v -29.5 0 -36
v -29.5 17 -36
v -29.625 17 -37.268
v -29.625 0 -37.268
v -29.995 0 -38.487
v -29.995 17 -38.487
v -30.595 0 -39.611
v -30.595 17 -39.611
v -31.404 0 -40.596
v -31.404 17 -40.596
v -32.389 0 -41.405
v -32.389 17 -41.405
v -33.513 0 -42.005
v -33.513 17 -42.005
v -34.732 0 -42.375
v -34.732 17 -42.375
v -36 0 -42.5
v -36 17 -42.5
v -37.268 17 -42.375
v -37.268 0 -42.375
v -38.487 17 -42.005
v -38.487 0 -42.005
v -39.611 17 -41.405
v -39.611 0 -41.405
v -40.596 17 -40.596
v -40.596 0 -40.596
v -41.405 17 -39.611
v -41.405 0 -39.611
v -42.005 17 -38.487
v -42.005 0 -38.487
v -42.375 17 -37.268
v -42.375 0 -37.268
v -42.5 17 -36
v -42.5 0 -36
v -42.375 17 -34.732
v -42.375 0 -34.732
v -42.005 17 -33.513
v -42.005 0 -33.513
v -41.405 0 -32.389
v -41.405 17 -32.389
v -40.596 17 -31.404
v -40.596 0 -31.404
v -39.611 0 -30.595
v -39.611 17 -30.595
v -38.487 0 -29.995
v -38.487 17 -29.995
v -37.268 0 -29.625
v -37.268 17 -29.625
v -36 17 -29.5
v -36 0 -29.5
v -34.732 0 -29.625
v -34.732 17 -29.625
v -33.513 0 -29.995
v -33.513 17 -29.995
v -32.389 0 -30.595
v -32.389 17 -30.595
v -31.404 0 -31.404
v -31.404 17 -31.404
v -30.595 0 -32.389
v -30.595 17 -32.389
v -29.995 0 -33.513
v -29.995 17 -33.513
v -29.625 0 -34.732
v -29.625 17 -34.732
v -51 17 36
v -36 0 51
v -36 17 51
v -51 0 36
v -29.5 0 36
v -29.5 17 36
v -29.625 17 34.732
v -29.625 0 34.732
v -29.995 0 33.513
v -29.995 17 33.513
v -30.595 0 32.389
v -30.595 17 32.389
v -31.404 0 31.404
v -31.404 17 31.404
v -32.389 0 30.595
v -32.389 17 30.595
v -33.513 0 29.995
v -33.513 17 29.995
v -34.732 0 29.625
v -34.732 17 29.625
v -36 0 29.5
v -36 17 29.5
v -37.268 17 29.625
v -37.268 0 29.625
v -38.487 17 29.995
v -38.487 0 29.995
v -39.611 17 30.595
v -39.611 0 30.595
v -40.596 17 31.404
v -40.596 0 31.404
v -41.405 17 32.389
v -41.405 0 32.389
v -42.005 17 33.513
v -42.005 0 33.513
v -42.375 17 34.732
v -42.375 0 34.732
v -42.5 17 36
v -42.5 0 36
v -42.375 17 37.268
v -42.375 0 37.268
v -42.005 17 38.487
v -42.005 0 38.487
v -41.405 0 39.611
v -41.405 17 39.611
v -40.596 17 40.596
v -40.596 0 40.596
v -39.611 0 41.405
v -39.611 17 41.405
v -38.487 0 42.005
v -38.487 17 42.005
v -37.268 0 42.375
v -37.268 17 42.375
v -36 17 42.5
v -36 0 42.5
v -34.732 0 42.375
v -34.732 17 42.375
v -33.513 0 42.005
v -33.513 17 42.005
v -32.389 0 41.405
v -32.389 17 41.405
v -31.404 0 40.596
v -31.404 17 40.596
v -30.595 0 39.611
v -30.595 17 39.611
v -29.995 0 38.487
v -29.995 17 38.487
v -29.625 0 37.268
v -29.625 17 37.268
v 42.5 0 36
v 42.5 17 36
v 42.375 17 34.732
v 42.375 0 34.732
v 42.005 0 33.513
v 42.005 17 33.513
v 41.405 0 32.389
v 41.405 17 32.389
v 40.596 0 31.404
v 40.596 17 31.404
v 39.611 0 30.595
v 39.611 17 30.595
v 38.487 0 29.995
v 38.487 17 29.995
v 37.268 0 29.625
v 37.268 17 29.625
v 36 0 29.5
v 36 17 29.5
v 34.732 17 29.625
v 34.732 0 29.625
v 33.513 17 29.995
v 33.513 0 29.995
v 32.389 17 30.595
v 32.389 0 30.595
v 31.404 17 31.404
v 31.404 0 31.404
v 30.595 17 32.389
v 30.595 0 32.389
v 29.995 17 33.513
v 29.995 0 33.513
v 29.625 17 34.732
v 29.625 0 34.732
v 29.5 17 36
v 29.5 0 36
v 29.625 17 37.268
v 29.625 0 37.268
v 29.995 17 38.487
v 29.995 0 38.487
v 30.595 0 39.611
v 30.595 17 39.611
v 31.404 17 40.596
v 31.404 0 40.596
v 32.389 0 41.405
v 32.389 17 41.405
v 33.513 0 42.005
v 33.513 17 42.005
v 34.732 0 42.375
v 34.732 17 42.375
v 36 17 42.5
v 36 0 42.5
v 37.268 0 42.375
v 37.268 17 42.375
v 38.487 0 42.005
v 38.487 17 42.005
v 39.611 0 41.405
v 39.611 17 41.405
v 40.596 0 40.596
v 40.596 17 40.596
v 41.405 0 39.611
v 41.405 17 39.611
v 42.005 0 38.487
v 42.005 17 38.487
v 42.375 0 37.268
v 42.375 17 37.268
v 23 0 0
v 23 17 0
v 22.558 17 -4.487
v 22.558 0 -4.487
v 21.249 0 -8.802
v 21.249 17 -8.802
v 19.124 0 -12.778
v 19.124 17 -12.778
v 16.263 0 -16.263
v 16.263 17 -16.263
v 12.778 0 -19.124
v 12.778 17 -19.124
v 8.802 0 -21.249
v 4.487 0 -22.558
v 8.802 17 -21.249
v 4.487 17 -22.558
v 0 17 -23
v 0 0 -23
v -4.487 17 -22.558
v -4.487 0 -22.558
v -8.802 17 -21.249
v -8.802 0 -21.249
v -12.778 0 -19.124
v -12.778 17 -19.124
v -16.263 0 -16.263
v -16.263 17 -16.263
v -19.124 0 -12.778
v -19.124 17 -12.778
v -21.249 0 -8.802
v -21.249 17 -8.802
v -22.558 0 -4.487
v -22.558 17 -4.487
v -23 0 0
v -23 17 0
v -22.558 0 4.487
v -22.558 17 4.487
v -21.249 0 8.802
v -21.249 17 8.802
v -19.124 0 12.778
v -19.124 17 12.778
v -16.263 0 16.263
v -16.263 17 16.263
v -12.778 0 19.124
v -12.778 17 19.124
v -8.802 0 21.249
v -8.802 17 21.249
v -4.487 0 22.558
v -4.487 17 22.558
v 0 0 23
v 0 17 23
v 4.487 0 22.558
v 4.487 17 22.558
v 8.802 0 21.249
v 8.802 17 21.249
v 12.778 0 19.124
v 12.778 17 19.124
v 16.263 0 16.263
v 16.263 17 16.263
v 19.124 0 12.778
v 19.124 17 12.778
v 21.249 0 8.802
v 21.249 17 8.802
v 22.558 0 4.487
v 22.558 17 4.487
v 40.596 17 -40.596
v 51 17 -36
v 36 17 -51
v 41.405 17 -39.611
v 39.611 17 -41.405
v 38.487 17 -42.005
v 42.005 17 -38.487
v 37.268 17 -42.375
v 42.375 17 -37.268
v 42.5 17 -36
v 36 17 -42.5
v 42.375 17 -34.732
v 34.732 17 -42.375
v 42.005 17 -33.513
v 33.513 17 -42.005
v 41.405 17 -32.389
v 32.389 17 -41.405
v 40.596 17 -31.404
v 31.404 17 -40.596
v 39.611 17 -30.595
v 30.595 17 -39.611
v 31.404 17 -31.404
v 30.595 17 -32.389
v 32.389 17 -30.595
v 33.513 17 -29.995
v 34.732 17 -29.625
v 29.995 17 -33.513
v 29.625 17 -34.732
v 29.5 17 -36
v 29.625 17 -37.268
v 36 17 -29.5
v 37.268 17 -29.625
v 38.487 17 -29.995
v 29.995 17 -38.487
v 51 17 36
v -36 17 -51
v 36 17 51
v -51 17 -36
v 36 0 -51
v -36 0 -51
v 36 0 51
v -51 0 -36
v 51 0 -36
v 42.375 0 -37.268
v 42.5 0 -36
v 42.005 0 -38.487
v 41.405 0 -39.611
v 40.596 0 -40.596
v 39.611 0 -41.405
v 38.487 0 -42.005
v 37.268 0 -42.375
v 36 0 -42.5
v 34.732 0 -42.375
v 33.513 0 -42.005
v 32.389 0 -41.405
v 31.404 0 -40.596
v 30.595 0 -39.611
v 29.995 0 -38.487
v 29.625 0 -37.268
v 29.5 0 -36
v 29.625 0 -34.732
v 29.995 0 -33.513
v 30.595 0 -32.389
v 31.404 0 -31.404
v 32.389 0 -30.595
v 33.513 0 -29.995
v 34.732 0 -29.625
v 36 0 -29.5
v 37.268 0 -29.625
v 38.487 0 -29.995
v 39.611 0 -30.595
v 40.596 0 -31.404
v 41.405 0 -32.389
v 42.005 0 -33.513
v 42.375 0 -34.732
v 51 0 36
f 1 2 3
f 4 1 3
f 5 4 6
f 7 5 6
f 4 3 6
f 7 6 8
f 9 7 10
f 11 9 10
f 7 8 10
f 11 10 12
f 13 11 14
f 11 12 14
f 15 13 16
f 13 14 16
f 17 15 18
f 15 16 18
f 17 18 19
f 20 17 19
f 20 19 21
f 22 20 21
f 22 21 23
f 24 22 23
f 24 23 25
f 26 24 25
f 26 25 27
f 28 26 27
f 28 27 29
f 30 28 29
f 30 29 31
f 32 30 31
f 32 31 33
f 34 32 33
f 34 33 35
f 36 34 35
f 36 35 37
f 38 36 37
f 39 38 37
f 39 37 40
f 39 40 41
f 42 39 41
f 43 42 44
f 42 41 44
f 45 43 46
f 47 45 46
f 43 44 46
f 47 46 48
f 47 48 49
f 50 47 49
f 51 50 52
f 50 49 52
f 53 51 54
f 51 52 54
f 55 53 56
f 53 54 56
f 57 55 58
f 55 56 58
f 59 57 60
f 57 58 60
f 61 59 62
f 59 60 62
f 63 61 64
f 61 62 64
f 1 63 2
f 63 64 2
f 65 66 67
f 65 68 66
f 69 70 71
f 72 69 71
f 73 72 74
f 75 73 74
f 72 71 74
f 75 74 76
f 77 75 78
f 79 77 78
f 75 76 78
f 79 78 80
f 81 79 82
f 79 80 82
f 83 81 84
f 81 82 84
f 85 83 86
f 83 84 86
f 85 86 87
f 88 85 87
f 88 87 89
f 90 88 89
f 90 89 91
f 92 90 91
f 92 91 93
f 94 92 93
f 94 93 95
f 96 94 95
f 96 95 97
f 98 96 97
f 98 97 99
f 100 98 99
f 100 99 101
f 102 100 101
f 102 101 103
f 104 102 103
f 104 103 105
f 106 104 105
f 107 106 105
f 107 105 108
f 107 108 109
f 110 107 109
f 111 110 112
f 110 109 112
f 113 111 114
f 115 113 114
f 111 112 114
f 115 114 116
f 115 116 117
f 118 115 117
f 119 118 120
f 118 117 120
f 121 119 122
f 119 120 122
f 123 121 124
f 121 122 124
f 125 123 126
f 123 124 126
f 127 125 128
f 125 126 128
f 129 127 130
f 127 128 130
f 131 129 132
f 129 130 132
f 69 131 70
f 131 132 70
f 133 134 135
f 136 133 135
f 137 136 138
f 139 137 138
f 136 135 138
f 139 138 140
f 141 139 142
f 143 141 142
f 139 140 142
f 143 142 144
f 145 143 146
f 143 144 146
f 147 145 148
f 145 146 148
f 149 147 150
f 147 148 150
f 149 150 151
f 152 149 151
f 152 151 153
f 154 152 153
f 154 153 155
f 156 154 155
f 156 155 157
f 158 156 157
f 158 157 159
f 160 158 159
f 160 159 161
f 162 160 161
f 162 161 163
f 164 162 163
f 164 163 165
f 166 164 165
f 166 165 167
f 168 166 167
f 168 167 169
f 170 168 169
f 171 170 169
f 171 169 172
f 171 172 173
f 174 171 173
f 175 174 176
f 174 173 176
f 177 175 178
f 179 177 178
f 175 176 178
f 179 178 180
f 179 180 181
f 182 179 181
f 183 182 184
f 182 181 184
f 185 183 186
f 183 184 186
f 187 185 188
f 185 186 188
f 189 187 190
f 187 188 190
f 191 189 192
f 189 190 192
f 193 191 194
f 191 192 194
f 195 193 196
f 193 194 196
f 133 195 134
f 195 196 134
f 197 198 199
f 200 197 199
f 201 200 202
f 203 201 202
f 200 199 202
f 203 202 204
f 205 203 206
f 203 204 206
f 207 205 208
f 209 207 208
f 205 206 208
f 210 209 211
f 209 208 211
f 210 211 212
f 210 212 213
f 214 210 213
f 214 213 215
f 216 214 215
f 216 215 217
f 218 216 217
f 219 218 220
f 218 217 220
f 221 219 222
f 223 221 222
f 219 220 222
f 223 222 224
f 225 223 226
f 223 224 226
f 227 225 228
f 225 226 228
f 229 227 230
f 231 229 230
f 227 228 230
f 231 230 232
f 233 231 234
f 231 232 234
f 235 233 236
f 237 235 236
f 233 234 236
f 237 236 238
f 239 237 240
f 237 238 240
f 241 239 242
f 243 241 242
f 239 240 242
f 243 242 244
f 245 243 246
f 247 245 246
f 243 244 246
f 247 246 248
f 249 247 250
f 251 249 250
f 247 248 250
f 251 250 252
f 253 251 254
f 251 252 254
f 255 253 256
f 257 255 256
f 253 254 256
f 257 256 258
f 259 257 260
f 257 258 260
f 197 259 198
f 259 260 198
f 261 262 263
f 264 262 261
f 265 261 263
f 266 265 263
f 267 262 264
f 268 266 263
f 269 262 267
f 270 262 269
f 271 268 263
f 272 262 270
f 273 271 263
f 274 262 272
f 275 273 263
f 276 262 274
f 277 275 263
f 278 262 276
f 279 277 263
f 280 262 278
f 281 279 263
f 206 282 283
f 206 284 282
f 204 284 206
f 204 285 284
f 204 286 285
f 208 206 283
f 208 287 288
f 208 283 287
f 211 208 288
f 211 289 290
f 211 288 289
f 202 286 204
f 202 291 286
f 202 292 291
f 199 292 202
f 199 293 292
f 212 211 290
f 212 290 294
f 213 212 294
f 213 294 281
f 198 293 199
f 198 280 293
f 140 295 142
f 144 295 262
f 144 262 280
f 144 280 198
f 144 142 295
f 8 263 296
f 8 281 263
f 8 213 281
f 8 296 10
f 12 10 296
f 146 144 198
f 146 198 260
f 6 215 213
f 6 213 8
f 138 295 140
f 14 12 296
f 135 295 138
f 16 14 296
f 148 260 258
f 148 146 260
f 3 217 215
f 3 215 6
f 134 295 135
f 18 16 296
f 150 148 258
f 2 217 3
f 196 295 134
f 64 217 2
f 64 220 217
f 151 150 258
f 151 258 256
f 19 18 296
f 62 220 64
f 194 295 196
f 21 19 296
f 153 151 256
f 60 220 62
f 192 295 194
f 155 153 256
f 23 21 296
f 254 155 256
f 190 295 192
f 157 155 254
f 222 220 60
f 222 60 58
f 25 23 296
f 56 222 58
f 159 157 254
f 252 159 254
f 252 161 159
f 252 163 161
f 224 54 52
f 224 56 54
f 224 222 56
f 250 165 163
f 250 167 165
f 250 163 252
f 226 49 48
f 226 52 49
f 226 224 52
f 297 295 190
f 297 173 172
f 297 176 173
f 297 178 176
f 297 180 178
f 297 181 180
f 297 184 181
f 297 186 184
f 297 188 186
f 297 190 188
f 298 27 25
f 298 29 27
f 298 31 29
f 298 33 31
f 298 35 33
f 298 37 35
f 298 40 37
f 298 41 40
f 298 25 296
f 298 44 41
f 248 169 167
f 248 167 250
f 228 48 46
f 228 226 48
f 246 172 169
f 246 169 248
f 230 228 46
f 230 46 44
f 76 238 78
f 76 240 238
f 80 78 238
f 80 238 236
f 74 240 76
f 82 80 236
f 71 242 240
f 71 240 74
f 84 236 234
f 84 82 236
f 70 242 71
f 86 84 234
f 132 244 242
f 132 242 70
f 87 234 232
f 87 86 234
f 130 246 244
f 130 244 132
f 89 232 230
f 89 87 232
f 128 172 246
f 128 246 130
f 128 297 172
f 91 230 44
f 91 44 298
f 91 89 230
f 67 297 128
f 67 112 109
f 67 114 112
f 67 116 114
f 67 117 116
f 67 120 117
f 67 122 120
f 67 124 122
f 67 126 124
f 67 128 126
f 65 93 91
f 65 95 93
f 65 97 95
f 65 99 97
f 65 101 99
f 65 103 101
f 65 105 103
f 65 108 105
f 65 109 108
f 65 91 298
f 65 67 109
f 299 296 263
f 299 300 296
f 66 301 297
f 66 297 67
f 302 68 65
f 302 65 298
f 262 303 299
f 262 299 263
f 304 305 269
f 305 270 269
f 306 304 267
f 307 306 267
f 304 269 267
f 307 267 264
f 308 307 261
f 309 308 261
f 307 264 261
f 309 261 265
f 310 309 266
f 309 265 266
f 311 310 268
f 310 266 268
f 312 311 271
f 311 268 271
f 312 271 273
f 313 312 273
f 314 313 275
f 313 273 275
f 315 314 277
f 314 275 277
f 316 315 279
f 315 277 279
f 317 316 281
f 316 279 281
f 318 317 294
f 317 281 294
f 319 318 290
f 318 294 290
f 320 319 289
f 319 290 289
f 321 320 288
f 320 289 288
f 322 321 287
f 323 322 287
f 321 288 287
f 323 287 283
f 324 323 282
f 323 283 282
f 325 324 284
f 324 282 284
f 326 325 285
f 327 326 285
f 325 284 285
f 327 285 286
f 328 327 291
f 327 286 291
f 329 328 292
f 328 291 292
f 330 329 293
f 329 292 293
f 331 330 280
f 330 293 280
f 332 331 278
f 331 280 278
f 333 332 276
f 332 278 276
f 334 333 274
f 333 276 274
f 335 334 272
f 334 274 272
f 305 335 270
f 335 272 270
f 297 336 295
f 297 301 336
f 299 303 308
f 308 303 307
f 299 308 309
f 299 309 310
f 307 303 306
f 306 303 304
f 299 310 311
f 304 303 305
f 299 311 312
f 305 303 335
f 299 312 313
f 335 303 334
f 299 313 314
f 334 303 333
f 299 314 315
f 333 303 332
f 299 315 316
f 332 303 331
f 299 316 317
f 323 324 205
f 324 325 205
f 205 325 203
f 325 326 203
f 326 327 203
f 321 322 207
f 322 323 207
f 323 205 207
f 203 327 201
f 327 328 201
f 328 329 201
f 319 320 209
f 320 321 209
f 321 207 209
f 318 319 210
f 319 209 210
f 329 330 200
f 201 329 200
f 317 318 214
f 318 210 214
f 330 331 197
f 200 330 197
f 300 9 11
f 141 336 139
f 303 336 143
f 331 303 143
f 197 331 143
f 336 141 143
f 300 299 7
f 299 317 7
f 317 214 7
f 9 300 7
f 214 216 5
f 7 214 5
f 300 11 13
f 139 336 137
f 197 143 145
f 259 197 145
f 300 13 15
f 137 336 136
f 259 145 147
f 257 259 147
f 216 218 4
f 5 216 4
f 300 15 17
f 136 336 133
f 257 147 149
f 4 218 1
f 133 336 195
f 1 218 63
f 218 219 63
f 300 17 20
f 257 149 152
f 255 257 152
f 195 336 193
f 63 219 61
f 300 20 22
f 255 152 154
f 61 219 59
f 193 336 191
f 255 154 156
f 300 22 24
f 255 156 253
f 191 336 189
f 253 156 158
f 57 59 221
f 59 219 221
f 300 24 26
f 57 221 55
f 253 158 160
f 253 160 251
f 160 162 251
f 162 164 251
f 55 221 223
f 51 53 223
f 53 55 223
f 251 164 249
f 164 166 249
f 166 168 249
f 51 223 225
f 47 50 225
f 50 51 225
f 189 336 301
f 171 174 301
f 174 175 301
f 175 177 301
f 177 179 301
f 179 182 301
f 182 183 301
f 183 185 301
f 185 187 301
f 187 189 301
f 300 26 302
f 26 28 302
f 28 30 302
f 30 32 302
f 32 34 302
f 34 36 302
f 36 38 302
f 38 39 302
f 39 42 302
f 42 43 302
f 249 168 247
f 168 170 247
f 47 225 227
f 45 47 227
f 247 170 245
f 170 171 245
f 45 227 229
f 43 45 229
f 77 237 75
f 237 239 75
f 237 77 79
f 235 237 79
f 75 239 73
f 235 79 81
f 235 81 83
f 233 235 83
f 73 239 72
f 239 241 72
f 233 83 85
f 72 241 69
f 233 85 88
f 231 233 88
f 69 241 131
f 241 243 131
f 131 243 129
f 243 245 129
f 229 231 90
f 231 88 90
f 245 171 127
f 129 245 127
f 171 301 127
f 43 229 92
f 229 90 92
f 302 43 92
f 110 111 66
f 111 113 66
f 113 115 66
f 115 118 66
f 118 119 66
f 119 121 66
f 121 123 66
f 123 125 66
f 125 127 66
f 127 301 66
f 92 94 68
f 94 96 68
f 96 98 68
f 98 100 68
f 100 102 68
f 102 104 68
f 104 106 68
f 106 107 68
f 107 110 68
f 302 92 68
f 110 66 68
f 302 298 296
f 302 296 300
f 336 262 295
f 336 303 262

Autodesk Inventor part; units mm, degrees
ref_plane "YZ Plane" through (0, 0, 0) normal (1, 0, 0) x (0, 1, 0)
ref_plane "XZ Plane" through (0, 0, 0) normal (0, 1, 0) x (-1, 0, 0)
ref_plane "XY Plane" through (0, 0, 0) normal (0, 0, 1) x (1, 0, 0)
sketch "Sketch1" plane through (0, 0, 0) normal (0, 1, 0) x (-1, 0, 0)
  line L0 (51, -51) -> (-51, -51)
  line L1 (-51, -51) -> (-51, 51)
  line L2 (-51, 51) -> (51, 51)
  line L3 (51, 51) -> (51, -51)
  line L4 (51, -51) -> (-51, 51) construction
  line L5 (-51, -51) -> (51, 51) construction
  point P0 (0, 0)
  dimension "d0" = 102
  dimension "d1" = 102
extrude "Extrusion1" add sketch "Sketch1" along normal blind 17
chamfer "Chamfer1" distance 15 angle 45 4 edges at (51, 8.5, 51) (51, 8.5, -51) (-51, 8.5, -51) (-51, 8.5, 51)
sketch "Sketch2" plane through (0, 17, 0) normal (0, 1, 0) x (1, 0, 0)
  line L0 (51, -36) -> (51, 36) projected
  line L1 (-51, 36) -> (-51, -36) projected
  line L2 (51, -36) -> (36, -51) projected
  line L3 (36, 51) -> (-36, 51)
  circle A0 centre (36, -36) radius 6.5
  circle A1 centre (-36, -36) radius 6.5
  circle A2 centre (36, 36) radius 6.5
  circle A3 centre (-36, 36) radius 6.5
  circle A4 centre (0, 0) radius 23
  dimension "d7" = 13
  dimension "d8" = 13
  dimension "d9" = 13
  dimension "d10" = 13
  dimension "d22" = 46
extrude "Extrusion2" cut sketch "Sketch2" against normal through all contours A0 | A1 | A2 | A3
thread "Thread1" size "M14x2" class "6H" standard "ANSI Metric M Profile" full length
thread "Thread2" size "M14x2" class "6H" standard "ANSI Metric M Profile" full length
thread "Thread3" size "M14x2" class "6H" standard "ANSI Metric M Profile" full length
thread "Thread4" size "M14x2" class "6H" standard "ANSI Metric M Profile" full length
sketch "Sketch3" plane through (0, 17, 0) normal (0, 1, 0) x (1, 0, 0)
  circle A0 centre (0, 0) radius 23
  dimension "d23" = 46
extrude "Extrusion3" cut sketch "Sketch3" against normal through all
properties part number "00.32.004 \"Flange\"" material "Steel"
